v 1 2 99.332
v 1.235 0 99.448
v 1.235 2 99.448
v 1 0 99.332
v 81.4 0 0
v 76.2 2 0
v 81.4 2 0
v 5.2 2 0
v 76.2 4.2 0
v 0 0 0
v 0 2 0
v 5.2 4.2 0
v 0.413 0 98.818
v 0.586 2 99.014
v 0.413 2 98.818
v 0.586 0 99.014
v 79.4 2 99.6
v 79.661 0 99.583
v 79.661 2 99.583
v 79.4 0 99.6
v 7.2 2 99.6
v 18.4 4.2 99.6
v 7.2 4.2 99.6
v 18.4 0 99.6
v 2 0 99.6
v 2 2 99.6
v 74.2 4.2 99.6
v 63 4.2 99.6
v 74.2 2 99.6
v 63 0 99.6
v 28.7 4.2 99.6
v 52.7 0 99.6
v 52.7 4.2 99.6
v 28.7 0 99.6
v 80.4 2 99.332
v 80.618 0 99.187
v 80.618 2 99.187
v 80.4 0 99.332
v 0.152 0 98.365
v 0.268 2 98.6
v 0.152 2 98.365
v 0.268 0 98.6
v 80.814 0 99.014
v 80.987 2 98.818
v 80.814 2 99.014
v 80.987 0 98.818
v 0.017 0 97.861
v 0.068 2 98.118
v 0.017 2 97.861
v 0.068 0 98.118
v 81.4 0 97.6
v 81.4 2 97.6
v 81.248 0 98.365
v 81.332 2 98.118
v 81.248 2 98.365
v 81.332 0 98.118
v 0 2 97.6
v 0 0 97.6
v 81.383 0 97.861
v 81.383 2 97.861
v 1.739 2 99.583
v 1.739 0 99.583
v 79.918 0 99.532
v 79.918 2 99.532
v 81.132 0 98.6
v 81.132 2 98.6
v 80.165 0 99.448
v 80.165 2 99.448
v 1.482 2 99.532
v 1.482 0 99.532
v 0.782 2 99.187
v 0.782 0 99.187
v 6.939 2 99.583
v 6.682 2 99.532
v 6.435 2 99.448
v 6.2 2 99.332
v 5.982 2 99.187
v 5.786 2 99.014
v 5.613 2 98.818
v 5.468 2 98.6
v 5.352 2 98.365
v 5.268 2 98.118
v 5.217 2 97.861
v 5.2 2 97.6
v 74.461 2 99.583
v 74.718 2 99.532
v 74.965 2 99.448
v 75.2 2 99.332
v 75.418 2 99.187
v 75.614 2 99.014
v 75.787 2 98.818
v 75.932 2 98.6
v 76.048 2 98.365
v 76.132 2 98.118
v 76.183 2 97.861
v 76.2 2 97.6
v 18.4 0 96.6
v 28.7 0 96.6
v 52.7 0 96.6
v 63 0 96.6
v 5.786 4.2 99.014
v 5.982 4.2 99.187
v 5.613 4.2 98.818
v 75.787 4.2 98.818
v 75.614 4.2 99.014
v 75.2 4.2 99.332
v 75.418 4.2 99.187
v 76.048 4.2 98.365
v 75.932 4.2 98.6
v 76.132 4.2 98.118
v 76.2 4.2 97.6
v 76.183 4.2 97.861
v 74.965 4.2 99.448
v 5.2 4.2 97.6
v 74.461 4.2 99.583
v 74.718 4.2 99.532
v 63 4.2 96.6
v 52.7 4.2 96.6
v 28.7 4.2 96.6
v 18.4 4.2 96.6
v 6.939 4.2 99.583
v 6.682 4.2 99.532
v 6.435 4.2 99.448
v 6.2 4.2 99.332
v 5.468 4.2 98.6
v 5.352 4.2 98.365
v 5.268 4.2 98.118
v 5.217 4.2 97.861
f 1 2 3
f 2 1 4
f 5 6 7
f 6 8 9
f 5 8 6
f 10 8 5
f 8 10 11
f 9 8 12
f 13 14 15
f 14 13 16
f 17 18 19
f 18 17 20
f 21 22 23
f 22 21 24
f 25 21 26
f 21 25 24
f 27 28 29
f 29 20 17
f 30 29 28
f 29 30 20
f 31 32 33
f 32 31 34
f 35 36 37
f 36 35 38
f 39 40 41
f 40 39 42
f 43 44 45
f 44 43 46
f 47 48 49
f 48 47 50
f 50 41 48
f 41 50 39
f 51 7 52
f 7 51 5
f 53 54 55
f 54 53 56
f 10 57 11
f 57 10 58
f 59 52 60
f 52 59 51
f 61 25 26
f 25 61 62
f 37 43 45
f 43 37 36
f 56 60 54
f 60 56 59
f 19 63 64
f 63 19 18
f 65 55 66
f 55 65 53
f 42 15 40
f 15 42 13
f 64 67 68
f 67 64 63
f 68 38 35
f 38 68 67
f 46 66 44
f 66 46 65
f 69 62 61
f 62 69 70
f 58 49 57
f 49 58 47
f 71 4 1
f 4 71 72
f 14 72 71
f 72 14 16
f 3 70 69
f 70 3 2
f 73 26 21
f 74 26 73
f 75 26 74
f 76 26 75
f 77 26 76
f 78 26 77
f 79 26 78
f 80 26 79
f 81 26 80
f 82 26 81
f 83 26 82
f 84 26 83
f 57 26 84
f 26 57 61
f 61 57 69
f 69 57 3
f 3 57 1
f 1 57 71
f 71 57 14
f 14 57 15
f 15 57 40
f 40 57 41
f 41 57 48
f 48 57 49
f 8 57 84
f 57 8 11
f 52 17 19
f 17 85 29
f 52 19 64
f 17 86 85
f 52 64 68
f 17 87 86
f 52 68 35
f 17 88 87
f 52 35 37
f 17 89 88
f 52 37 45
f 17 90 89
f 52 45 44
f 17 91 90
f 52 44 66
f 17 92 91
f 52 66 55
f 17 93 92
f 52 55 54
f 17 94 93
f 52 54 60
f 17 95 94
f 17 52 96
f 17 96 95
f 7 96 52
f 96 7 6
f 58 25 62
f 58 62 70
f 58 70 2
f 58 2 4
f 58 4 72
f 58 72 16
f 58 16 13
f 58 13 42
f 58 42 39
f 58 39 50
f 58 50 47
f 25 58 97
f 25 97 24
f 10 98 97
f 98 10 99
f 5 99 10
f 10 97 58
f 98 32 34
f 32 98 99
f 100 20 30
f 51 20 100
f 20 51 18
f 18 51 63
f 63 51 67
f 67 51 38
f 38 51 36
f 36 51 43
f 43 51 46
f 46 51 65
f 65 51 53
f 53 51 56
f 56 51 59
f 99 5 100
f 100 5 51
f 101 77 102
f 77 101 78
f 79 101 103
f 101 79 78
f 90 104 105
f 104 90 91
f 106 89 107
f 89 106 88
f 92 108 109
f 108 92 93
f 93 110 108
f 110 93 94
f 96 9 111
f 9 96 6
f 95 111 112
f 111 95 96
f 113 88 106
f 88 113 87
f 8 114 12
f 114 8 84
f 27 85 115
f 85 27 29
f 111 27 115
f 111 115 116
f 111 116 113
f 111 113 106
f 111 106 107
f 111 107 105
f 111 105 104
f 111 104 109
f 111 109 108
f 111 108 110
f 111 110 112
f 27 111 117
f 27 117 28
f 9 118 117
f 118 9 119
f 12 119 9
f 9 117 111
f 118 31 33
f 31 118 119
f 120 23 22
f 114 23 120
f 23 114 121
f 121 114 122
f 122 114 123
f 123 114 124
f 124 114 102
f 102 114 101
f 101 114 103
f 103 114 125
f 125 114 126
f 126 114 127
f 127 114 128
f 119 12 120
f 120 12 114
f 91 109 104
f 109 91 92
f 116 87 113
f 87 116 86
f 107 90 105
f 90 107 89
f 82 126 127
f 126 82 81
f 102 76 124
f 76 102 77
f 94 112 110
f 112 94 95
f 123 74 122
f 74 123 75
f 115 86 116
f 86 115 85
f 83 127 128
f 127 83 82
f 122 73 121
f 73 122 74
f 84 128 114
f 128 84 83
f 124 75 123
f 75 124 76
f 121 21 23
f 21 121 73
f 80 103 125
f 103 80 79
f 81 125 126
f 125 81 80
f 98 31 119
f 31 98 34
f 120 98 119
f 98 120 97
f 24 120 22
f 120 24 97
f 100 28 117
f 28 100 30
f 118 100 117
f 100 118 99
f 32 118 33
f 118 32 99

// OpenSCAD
// Center body back door (SolidWorks part 007; replaces the older part 006).
// Same stepped profile as the other doors, slid in from the top. The top
// corners are rounded and two notches in the top edge leave room for wires
// going up into the display box.
// Frame: X = width, Y = depth (0 = inside face, toward the front), Z = height.

center_door_w = 81.4;          // flange width (rides in the grooves)
center_door_h = 99.6;
center_door_flange_t = 2.0;    // flange thickness
center_door_lip_t = 2.2;       // lip thickness (flush with the back)
center_door_lip_inset = 5.2;   // lip is narrower than the flange by this much on each side
center_door_corner_r = 2.0;    // radius of the rounded top corners
center_door_notch_x = 18.4;    // notch distance from each side
center_door_notch_w = 10.3;
center_door_notch_d = 3.0;     // notch depth down from the top edge

// Plate with its top two corners rounded (drawn in the XZ plane, extruded along +Y)
module center_door_plate(w, t, h, r) {
  rotate([90, 0, 0]) mirror([0, 0, 1]) linear_extrude(t)
    hull() {
      square([w, h - r]);
      for (x = [r, w - r]) translate([x, h - r]) circle(r = r);
    }
}

module center_door() {
  $fn = 48;  // set here, not at file level: a top-level $fn doesn't apply when this file is use<>d
  difference() {
    union() {
      center_door_plate(center_door_w, center_door_flange_t, center_door_h, center_door_corner_r);
      translate([center_door_lip_inset, 0, 0])
        center_door_plate(center_door_w - 2 * center_door_lip_inset, center_door_flange_t + center_door_lip_t,
                          center_door_h, center_door_corner_r);
    }
    // Wire notches in the top edge (symmetric)
    for (x = [center_door_notch_x, center_door_w - center_door_notch_x - center_door_notch_w])
      translate([x, -1, center_door_h - center_door_notch_d])
        cube([center_door_notch_w, center_door_flange_t + center_door_lip_t + 2, center_door_notch_d + 1]);
  }
}

center_door();
